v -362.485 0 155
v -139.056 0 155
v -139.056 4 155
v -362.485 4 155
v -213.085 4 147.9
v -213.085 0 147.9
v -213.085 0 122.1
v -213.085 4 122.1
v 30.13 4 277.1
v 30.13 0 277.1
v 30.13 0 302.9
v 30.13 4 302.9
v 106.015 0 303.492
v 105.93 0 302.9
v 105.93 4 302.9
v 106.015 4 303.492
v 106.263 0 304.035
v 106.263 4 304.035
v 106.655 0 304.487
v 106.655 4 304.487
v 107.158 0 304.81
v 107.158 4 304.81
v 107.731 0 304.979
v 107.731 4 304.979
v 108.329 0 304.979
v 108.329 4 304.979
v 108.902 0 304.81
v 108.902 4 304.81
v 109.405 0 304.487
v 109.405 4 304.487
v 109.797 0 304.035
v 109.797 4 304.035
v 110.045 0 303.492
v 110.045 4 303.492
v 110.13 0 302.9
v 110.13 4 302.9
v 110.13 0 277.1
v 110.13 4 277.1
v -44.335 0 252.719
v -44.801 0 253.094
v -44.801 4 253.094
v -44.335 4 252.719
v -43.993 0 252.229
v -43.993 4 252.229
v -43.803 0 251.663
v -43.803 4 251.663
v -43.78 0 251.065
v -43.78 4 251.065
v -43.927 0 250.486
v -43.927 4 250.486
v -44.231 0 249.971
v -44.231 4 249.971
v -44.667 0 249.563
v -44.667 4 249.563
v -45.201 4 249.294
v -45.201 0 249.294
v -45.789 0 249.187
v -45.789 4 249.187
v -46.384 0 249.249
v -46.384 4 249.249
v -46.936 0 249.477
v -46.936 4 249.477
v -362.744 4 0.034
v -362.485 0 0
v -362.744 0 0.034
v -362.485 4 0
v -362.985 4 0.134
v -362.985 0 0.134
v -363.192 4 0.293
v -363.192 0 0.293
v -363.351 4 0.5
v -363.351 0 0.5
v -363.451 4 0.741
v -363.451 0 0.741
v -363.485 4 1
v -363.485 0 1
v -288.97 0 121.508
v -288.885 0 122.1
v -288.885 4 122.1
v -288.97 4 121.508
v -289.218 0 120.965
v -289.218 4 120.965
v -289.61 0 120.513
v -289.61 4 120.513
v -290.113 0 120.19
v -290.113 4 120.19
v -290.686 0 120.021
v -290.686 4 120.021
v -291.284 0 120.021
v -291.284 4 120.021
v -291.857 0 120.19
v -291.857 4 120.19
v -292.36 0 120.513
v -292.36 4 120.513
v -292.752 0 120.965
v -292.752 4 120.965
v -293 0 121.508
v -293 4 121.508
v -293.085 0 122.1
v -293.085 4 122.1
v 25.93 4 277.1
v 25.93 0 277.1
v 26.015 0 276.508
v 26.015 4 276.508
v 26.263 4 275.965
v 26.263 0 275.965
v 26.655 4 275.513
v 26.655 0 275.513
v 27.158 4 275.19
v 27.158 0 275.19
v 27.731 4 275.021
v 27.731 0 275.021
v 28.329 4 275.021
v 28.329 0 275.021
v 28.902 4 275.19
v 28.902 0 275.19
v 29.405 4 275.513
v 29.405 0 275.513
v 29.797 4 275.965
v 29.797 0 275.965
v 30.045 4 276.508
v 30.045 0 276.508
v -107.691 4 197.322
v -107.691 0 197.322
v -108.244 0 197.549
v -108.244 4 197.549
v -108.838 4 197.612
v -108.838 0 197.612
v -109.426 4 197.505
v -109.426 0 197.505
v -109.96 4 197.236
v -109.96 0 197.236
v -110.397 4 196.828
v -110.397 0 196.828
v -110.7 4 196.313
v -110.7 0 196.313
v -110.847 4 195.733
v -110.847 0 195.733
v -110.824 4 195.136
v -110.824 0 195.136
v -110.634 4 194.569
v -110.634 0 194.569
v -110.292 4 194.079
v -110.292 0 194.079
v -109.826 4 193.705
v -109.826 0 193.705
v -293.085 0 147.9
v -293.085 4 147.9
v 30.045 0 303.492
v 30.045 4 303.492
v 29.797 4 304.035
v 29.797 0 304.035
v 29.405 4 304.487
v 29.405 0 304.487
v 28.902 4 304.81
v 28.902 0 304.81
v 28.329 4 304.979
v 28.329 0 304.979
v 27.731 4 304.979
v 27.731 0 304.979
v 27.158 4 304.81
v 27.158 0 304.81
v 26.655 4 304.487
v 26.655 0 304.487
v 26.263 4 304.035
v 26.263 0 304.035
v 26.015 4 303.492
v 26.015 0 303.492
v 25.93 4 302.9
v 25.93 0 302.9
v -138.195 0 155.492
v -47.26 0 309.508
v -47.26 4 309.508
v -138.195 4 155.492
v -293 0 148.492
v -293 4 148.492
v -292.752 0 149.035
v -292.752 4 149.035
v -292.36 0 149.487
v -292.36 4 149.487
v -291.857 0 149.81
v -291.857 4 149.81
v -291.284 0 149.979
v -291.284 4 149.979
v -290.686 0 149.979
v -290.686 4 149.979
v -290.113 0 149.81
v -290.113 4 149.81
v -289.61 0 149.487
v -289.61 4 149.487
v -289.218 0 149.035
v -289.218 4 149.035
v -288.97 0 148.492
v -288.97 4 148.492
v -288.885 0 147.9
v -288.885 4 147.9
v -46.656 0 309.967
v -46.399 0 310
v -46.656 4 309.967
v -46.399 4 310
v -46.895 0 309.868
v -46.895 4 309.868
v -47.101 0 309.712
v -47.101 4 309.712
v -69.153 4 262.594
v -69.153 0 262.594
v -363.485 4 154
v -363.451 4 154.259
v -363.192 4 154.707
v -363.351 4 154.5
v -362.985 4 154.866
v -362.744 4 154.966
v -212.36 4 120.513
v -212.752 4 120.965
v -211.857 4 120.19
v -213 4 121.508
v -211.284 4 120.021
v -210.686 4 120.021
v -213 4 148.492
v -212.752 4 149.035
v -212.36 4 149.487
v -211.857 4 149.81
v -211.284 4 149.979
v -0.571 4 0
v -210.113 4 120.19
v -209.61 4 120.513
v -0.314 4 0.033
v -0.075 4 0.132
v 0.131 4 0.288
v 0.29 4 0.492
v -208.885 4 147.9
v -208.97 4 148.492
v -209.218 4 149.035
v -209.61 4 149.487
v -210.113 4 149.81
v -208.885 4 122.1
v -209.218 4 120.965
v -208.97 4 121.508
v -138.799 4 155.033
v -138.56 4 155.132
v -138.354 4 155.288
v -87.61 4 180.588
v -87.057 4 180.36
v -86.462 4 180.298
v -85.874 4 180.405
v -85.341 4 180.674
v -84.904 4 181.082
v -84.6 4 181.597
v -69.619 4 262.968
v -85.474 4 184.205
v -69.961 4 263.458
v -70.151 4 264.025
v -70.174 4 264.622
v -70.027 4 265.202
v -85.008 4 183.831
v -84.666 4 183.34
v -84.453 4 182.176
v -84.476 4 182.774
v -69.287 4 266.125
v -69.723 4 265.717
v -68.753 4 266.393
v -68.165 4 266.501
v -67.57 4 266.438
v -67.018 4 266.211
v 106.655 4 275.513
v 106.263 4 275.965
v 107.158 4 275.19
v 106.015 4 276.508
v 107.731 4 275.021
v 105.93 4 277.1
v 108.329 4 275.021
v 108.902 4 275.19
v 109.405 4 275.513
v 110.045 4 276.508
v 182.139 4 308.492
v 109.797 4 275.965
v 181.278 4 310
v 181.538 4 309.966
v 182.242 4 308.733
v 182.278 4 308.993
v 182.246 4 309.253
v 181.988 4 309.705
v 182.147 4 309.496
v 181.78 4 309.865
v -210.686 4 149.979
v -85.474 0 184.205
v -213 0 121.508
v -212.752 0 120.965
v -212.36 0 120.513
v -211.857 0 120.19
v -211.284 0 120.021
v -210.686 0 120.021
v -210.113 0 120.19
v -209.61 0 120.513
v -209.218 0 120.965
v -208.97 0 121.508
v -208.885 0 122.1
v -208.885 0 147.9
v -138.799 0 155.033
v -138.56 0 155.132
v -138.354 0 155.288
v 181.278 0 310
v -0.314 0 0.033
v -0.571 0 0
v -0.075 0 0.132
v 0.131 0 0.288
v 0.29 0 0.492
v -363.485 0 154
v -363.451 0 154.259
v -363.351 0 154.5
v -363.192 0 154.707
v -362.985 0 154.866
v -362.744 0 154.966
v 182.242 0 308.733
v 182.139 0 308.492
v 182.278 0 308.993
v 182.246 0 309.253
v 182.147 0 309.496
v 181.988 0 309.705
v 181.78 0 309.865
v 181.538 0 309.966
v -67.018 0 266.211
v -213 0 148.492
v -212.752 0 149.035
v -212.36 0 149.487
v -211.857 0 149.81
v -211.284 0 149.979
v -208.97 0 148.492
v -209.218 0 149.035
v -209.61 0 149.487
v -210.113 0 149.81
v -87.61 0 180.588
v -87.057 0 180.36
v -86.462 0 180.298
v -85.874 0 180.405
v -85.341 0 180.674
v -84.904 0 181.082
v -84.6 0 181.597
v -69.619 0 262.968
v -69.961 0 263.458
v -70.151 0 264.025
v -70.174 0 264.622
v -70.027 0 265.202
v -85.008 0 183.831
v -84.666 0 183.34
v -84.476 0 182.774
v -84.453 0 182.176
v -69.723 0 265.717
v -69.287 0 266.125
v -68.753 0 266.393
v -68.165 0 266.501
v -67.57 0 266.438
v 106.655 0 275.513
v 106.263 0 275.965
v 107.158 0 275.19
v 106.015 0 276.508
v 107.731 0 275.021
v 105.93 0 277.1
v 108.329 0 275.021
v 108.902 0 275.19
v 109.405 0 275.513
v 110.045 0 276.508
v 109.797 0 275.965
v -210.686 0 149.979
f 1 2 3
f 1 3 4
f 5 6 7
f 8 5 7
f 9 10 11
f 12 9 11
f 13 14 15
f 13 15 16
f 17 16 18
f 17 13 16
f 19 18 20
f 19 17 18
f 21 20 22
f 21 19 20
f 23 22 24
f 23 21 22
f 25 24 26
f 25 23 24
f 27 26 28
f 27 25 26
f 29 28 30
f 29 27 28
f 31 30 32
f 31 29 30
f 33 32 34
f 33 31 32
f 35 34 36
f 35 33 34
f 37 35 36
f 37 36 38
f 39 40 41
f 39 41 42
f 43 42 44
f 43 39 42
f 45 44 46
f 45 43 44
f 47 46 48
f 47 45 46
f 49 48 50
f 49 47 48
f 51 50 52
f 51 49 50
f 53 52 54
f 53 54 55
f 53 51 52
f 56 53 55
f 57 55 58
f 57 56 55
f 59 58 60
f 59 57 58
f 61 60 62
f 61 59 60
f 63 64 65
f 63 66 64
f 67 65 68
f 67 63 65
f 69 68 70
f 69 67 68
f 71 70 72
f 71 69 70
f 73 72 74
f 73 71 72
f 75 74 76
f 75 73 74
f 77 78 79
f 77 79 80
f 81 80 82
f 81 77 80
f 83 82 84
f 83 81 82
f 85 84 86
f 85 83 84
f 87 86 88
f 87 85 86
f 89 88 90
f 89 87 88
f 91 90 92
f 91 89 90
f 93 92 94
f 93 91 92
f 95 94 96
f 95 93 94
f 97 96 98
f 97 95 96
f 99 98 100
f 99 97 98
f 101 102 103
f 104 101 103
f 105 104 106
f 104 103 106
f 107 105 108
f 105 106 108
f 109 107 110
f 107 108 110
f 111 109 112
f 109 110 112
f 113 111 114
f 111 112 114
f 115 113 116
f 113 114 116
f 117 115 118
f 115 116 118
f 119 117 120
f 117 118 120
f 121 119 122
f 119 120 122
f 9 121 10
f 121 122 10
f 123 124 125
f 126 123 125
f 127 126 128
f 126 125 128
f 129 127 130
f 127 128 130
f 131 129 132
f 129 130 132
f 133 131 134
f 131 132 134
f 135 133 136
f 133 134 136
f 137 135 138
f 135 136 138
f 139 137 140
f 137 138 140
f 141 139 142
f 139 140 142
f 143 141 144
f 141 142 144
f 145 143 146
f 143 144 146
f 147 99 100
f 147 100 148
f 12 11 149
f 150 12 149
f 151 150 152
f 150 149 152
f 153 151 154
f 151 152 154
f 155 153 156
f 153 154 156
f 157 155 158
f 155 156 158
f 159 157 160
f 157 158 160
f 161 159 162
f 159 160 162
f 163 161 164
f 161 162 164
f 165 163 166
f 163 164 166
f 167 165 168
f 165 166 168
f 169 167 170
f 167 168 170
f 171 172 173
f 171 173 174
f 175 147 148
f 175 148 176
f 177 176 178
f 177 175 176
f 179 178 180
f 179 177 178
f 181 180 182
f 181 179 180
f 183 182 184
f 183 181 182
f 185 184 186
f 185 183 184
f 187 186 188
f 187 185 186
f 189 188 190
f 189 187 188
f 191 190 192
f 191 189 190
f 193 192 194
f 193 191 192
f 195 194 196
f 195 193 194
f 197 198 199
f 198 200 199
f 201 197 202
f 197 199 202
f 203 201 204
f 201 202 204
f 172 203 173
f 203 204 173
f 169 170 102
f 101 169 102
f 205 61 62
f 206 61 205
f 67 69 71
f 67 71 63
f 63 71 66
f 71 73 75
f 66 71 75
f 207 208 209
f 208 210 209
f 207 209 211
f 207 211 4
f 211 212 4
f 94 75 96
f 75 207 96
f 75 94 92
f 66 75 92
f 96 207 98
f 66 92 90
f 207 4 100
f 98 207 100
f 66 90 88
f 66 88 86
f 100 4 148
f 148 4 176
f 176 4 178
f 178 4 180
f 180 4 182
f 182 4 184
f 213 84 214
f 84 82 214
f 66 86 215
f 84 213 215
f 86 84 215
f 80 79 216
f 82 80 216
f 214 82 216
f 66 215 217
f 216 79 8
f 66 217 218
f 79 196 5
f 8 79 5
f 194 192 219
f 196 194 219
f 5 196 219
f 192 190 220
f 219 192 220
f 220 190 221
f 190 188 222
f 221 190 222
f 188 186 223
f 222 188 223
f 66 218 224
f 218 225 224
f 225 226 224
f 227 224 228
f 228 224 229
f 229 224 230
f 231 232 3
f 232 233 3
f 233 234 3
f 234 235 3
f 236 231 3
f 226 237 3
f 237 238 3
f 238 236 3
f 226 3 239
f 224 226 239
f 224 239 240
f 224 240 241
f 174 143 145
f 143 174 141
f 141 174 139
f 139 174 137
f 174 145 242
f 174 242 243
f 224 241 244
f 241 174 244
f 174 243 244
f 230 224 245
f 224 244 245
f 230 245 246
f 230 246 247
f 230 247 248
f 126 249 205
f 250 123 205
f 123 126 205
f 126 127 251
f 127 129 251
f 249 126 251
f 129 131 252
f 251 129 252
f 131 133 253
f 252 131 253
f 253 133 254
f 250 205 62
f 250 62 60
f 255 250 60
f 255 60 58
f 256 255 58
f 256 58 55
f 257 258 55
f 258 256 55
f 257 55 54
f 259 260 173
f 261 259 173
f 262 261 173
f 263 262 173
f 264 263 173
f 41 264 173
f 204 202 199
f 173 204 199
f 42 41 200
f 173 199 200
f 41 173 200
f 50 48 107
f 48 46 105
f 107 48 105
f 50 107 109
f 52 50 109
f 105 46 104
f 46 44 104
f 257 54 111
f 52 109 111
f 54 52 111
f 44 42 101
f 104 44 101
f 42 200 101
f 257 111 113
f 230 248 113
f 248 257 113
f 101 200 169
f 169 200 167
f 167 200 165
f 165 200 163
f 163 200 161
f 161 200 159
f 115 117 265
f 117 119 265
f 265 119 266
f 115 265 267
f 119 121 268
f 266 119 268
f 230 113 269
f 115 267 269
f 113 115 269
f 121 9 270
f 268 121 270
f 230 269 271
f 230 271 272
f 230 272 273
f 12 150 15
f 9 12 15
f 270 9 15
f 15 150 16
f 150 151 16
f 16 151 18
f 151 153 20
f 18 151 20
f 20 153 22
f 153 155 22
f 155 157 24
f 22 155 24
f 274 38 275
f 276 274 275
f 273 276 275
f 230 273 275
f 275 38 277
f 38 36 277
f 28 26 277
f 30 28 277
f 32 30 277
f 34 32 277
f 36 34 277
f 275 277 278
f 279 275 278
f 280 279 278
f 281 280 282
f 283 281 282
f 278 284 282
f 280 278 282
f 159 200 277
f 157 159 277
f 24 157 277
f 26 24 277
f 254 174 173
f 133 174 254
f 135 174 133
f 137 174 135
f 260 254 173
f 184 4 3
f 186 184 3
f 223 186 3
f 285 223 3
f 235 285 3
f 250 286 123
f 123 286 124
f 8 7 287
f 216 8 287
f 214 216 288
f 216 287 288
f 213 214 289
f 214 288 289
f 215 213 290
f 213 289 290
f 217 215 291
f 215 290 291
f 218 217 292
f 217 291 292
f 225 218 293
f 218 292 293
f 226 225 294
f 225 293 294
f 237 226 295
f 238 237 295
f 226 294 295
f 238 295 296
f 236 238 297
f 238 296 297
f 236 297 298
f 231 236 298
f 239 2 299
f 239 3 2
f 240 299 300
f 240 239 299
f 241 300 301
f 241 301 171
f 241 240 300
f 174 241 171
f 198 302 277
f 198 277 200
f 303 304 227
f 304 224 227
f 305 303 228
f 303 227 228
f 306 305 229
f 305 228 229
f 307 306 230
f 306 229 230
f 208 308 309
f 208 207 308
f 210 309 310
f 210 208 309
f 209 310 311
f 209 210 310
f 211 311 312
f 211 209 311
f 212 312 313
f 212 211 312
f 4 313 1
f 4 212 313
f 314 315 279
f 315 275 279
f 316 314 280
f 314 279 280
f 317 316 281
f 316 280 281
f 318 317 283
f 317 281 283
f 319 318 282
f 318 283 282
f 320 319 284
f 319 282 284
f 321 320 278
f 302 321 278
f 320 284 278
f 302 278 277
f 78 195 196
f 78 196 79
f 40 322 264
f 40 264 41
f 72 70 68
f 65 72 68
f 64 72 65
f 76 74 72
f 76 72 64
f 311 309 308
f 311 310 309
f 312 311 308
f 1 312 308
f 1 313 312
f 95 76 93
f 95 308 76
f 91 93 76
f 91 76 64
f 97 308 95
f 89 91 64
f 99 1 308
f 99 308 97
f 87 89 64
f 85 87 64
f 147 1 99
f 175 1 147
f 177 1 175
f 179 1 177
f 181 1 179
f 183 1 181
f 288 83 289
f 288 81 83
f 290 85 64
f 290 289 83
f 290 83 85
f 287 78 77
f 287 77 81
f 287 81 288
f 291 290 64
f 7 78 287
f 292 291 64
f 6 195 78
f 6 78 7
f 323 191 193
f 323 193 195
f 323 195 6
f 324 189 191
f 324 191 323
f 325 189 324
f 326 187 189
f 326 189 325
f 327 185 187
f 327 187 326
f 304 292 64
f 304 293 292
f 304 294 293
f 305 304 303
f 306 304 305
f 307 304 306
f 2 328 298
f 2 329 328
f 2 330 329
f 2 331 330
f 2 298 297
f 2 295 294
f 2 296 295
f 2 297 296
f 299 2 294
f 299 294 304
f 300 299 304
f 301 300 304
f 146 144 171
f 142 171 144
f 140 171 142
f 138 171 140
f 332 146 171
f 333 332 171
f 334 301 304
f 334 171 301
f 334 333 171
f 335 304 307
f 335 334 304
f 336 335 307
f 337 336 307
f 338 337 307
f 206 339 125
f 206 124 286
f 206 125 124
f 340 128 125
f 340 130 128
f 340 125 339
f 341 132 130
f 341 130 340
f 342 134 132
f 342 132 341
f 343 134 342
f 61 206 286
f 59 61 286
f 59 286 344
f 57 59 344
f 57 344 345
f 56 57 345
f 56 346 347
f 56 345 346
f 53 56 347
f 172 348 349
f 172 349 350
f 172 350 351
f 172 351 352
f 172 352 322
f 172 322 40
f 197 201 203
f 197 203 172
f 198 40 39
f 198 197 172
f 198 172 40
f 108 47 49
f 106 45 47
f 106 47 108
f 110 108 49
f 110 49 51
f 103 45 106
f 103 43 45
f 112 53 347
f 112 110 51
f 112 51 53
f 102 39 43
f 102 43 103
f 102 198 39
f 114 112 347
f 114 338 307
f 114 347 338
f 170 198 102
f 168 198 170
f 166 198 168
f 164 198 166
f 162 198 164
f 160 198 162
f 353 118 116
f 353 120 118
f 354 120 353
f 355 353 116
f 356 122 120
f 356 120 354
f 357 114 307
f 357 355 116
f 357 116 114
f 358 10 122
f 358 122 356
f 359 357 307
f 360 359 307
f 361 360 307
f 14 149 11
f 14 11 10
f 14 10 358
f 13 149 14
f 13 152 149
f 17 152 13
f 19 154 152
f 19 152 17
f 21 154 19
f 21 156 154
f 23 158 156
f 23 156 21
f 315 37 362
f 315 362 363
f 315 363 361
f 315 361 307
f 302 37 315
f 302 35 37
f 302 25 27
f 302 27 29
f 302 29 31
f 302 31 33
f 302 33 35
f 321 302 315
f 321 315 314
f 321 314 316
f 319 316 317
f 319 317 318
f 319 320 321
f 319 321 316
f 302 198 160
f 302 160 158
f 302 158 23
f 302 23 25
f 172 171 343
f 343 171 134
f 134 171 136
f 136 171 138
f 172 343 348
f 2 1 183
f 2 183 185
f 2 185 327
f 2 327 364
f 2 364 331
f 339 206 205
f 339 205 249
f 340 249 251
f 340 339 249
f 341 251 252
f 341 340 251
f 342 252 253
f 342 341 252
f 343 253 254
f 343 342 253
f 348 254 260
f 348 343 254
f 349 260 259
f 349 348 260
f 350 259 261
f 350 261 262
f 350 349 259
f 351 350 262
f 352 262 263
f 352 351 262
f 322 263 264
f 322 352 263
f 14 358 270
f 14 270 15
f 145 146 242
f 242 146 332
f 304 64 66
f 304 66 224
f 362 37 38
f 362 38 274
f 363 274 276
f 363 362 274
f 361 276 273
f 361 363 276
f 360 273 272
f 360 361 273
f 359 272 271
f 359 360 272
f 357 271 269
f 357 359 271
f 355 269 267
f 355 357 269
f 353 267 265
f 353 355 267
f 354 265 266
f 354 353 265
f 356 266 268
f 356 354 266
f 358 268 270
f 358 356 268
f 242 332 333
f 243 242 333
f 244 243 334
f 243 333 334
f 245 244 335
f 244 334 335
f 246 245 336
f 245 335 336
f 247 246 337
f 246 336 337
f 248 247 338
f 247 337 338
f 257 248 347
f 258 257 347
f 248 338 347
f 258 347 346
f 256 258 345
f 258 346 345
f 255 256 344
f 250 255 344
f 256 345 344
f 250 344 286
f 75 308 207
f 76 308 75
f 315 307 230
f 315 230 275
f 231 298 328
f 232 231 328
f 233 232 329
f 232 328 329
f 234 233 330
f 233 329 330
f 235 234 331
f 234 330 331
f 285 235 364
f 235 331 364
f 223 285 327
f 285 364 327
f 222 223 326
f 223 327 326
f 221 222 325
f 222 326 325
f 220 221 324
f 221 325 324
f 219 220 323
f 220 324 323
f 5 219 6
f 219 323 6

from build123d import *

# Parameters (mm, degrees)
BOSS_EXTRUDE1_DEPTH = 4
FILLET1_R           = 1


with BuildPart() as part:
    # Sketch1 → Boss-Extrude1 (new body)
    with BuildSketch(Plane(origin=(0, 0, 0), x_dir=(-1, 0, 0), z_dir=(0, 1, 0))):
        Polygon((363.484973911, 0), (0, 0), (-183.030052177, 310), (46.969947823, 310), (138.484973911, 155), (363.484973911, 155), align=None)
        with BuildLine():
            ThreePointArc((288.884973911, 122.1), (290.984973911, 120), (293.084973911, 122.1))
            Line((293.084973911, 122.1), (293.084973911, 147.9))
            ThreePointArc((293.084973911, 147.9), (290.984973911, 150), (288.884973911, 147.9))
            Line((288.884973911, 147.9), (288.884973911, 122.1))
        make_face(mode=Mode.SUBTRACT)
        with BuildLine():
            ThreePointArc((69.152908152, 262.594027053), (69.893566181, 265.470035691), (67.017557543, 266.21069372))
            Line((67.017557543, 266.21069372), (44.800890876, 253.09353998))
            ThreePointArc((44.800890876, 253.09353998), (44.060232847, 250.217531343), (46.936241485, 249.476873314))
            Line((46.936241485, 249.476873314), (69.152908152, 262.594027053))
        make_face(mode=Mode.SUBTRACT)
        with BuildLine():
            ThreePointArc((-110.130052177, 277.1), (-108.030052177, 275), (-105.930052177, 277.1))
            Line((-105.930052177, 277.1), (-105.930052177, 302.9))
            ThreePointArc((-105.930052177, 302.9), (-108.030052177, 305), (-110.130052177, 302.9))
            Line((-110.130052177, 302.9), (-110.130052177, 277.1))
        make_face(mode=Mode.SUBTRACT)
        with BuildLine():
            Line((-25.930052177, 302.9), (-25.930052177, 277.1))
            ThreePointArc((-25.930052177, 277.1), (-28.030052177, 275), (-30.130052177, 277.1))
            Line((-30.130052177, 277.1), (-30.130052177, 302.9))
            ThreePointArc((-30.130052177, 302.9), (-28.030052177, 305), (-25.930052177, 302.9))
        make_face(mode=Mode.SUBTRACT)
        with BuildLine():
            Line((85.474235805, 184.204651092), (107.690902471, 197.321804831))
            ThreePointArc((107.690902471, 197.321804831), (110.566911109, 196.581146802), (109.82625308, 193.705138164))
            Line((109.82625308, 193.705138164), (87.609586413, 180.587984425))
            ThreePointArc((87.609586413, 180.587984425), (84.733577776, 181.328642454), (85.474235805, 184.204651092))
        make_face(mode=Mode.SUBTRACT)
        with BuildLine():
            Line((213.084973911, 147.9), (213.084973911, 122.1))
            ThreePointArc((213.084973911, 122.1), (210.984973911, 120), (208.884973911, 122.1))
            Line((208.884973911, 122.1), (208.884973911, 147.9))
            ThreePointArc((208.884973911, 147.9), (210.984973911, 150), (213.084973911, 147.9))
        make_face(mode=Mode.SUBTRACT)
    extrude(amount=BOSS_EXTRUDE1_DEPTH)

    # Fillet1
    fillet1_edges = [part.edges().sort_by_distance(p)[0] for p in [
        (0, 2, 0),
        (183.030052177, 2, 310),
        (-46.969947823, 2, 310),
        (-138.484973911, 2, 155),
        (-363.484973911, 2, 155),
        (-363.484973911, 2, 0),
    ]]
    fillet(fillet1_edges, radius=FILLET1_R)


solid = part.part
